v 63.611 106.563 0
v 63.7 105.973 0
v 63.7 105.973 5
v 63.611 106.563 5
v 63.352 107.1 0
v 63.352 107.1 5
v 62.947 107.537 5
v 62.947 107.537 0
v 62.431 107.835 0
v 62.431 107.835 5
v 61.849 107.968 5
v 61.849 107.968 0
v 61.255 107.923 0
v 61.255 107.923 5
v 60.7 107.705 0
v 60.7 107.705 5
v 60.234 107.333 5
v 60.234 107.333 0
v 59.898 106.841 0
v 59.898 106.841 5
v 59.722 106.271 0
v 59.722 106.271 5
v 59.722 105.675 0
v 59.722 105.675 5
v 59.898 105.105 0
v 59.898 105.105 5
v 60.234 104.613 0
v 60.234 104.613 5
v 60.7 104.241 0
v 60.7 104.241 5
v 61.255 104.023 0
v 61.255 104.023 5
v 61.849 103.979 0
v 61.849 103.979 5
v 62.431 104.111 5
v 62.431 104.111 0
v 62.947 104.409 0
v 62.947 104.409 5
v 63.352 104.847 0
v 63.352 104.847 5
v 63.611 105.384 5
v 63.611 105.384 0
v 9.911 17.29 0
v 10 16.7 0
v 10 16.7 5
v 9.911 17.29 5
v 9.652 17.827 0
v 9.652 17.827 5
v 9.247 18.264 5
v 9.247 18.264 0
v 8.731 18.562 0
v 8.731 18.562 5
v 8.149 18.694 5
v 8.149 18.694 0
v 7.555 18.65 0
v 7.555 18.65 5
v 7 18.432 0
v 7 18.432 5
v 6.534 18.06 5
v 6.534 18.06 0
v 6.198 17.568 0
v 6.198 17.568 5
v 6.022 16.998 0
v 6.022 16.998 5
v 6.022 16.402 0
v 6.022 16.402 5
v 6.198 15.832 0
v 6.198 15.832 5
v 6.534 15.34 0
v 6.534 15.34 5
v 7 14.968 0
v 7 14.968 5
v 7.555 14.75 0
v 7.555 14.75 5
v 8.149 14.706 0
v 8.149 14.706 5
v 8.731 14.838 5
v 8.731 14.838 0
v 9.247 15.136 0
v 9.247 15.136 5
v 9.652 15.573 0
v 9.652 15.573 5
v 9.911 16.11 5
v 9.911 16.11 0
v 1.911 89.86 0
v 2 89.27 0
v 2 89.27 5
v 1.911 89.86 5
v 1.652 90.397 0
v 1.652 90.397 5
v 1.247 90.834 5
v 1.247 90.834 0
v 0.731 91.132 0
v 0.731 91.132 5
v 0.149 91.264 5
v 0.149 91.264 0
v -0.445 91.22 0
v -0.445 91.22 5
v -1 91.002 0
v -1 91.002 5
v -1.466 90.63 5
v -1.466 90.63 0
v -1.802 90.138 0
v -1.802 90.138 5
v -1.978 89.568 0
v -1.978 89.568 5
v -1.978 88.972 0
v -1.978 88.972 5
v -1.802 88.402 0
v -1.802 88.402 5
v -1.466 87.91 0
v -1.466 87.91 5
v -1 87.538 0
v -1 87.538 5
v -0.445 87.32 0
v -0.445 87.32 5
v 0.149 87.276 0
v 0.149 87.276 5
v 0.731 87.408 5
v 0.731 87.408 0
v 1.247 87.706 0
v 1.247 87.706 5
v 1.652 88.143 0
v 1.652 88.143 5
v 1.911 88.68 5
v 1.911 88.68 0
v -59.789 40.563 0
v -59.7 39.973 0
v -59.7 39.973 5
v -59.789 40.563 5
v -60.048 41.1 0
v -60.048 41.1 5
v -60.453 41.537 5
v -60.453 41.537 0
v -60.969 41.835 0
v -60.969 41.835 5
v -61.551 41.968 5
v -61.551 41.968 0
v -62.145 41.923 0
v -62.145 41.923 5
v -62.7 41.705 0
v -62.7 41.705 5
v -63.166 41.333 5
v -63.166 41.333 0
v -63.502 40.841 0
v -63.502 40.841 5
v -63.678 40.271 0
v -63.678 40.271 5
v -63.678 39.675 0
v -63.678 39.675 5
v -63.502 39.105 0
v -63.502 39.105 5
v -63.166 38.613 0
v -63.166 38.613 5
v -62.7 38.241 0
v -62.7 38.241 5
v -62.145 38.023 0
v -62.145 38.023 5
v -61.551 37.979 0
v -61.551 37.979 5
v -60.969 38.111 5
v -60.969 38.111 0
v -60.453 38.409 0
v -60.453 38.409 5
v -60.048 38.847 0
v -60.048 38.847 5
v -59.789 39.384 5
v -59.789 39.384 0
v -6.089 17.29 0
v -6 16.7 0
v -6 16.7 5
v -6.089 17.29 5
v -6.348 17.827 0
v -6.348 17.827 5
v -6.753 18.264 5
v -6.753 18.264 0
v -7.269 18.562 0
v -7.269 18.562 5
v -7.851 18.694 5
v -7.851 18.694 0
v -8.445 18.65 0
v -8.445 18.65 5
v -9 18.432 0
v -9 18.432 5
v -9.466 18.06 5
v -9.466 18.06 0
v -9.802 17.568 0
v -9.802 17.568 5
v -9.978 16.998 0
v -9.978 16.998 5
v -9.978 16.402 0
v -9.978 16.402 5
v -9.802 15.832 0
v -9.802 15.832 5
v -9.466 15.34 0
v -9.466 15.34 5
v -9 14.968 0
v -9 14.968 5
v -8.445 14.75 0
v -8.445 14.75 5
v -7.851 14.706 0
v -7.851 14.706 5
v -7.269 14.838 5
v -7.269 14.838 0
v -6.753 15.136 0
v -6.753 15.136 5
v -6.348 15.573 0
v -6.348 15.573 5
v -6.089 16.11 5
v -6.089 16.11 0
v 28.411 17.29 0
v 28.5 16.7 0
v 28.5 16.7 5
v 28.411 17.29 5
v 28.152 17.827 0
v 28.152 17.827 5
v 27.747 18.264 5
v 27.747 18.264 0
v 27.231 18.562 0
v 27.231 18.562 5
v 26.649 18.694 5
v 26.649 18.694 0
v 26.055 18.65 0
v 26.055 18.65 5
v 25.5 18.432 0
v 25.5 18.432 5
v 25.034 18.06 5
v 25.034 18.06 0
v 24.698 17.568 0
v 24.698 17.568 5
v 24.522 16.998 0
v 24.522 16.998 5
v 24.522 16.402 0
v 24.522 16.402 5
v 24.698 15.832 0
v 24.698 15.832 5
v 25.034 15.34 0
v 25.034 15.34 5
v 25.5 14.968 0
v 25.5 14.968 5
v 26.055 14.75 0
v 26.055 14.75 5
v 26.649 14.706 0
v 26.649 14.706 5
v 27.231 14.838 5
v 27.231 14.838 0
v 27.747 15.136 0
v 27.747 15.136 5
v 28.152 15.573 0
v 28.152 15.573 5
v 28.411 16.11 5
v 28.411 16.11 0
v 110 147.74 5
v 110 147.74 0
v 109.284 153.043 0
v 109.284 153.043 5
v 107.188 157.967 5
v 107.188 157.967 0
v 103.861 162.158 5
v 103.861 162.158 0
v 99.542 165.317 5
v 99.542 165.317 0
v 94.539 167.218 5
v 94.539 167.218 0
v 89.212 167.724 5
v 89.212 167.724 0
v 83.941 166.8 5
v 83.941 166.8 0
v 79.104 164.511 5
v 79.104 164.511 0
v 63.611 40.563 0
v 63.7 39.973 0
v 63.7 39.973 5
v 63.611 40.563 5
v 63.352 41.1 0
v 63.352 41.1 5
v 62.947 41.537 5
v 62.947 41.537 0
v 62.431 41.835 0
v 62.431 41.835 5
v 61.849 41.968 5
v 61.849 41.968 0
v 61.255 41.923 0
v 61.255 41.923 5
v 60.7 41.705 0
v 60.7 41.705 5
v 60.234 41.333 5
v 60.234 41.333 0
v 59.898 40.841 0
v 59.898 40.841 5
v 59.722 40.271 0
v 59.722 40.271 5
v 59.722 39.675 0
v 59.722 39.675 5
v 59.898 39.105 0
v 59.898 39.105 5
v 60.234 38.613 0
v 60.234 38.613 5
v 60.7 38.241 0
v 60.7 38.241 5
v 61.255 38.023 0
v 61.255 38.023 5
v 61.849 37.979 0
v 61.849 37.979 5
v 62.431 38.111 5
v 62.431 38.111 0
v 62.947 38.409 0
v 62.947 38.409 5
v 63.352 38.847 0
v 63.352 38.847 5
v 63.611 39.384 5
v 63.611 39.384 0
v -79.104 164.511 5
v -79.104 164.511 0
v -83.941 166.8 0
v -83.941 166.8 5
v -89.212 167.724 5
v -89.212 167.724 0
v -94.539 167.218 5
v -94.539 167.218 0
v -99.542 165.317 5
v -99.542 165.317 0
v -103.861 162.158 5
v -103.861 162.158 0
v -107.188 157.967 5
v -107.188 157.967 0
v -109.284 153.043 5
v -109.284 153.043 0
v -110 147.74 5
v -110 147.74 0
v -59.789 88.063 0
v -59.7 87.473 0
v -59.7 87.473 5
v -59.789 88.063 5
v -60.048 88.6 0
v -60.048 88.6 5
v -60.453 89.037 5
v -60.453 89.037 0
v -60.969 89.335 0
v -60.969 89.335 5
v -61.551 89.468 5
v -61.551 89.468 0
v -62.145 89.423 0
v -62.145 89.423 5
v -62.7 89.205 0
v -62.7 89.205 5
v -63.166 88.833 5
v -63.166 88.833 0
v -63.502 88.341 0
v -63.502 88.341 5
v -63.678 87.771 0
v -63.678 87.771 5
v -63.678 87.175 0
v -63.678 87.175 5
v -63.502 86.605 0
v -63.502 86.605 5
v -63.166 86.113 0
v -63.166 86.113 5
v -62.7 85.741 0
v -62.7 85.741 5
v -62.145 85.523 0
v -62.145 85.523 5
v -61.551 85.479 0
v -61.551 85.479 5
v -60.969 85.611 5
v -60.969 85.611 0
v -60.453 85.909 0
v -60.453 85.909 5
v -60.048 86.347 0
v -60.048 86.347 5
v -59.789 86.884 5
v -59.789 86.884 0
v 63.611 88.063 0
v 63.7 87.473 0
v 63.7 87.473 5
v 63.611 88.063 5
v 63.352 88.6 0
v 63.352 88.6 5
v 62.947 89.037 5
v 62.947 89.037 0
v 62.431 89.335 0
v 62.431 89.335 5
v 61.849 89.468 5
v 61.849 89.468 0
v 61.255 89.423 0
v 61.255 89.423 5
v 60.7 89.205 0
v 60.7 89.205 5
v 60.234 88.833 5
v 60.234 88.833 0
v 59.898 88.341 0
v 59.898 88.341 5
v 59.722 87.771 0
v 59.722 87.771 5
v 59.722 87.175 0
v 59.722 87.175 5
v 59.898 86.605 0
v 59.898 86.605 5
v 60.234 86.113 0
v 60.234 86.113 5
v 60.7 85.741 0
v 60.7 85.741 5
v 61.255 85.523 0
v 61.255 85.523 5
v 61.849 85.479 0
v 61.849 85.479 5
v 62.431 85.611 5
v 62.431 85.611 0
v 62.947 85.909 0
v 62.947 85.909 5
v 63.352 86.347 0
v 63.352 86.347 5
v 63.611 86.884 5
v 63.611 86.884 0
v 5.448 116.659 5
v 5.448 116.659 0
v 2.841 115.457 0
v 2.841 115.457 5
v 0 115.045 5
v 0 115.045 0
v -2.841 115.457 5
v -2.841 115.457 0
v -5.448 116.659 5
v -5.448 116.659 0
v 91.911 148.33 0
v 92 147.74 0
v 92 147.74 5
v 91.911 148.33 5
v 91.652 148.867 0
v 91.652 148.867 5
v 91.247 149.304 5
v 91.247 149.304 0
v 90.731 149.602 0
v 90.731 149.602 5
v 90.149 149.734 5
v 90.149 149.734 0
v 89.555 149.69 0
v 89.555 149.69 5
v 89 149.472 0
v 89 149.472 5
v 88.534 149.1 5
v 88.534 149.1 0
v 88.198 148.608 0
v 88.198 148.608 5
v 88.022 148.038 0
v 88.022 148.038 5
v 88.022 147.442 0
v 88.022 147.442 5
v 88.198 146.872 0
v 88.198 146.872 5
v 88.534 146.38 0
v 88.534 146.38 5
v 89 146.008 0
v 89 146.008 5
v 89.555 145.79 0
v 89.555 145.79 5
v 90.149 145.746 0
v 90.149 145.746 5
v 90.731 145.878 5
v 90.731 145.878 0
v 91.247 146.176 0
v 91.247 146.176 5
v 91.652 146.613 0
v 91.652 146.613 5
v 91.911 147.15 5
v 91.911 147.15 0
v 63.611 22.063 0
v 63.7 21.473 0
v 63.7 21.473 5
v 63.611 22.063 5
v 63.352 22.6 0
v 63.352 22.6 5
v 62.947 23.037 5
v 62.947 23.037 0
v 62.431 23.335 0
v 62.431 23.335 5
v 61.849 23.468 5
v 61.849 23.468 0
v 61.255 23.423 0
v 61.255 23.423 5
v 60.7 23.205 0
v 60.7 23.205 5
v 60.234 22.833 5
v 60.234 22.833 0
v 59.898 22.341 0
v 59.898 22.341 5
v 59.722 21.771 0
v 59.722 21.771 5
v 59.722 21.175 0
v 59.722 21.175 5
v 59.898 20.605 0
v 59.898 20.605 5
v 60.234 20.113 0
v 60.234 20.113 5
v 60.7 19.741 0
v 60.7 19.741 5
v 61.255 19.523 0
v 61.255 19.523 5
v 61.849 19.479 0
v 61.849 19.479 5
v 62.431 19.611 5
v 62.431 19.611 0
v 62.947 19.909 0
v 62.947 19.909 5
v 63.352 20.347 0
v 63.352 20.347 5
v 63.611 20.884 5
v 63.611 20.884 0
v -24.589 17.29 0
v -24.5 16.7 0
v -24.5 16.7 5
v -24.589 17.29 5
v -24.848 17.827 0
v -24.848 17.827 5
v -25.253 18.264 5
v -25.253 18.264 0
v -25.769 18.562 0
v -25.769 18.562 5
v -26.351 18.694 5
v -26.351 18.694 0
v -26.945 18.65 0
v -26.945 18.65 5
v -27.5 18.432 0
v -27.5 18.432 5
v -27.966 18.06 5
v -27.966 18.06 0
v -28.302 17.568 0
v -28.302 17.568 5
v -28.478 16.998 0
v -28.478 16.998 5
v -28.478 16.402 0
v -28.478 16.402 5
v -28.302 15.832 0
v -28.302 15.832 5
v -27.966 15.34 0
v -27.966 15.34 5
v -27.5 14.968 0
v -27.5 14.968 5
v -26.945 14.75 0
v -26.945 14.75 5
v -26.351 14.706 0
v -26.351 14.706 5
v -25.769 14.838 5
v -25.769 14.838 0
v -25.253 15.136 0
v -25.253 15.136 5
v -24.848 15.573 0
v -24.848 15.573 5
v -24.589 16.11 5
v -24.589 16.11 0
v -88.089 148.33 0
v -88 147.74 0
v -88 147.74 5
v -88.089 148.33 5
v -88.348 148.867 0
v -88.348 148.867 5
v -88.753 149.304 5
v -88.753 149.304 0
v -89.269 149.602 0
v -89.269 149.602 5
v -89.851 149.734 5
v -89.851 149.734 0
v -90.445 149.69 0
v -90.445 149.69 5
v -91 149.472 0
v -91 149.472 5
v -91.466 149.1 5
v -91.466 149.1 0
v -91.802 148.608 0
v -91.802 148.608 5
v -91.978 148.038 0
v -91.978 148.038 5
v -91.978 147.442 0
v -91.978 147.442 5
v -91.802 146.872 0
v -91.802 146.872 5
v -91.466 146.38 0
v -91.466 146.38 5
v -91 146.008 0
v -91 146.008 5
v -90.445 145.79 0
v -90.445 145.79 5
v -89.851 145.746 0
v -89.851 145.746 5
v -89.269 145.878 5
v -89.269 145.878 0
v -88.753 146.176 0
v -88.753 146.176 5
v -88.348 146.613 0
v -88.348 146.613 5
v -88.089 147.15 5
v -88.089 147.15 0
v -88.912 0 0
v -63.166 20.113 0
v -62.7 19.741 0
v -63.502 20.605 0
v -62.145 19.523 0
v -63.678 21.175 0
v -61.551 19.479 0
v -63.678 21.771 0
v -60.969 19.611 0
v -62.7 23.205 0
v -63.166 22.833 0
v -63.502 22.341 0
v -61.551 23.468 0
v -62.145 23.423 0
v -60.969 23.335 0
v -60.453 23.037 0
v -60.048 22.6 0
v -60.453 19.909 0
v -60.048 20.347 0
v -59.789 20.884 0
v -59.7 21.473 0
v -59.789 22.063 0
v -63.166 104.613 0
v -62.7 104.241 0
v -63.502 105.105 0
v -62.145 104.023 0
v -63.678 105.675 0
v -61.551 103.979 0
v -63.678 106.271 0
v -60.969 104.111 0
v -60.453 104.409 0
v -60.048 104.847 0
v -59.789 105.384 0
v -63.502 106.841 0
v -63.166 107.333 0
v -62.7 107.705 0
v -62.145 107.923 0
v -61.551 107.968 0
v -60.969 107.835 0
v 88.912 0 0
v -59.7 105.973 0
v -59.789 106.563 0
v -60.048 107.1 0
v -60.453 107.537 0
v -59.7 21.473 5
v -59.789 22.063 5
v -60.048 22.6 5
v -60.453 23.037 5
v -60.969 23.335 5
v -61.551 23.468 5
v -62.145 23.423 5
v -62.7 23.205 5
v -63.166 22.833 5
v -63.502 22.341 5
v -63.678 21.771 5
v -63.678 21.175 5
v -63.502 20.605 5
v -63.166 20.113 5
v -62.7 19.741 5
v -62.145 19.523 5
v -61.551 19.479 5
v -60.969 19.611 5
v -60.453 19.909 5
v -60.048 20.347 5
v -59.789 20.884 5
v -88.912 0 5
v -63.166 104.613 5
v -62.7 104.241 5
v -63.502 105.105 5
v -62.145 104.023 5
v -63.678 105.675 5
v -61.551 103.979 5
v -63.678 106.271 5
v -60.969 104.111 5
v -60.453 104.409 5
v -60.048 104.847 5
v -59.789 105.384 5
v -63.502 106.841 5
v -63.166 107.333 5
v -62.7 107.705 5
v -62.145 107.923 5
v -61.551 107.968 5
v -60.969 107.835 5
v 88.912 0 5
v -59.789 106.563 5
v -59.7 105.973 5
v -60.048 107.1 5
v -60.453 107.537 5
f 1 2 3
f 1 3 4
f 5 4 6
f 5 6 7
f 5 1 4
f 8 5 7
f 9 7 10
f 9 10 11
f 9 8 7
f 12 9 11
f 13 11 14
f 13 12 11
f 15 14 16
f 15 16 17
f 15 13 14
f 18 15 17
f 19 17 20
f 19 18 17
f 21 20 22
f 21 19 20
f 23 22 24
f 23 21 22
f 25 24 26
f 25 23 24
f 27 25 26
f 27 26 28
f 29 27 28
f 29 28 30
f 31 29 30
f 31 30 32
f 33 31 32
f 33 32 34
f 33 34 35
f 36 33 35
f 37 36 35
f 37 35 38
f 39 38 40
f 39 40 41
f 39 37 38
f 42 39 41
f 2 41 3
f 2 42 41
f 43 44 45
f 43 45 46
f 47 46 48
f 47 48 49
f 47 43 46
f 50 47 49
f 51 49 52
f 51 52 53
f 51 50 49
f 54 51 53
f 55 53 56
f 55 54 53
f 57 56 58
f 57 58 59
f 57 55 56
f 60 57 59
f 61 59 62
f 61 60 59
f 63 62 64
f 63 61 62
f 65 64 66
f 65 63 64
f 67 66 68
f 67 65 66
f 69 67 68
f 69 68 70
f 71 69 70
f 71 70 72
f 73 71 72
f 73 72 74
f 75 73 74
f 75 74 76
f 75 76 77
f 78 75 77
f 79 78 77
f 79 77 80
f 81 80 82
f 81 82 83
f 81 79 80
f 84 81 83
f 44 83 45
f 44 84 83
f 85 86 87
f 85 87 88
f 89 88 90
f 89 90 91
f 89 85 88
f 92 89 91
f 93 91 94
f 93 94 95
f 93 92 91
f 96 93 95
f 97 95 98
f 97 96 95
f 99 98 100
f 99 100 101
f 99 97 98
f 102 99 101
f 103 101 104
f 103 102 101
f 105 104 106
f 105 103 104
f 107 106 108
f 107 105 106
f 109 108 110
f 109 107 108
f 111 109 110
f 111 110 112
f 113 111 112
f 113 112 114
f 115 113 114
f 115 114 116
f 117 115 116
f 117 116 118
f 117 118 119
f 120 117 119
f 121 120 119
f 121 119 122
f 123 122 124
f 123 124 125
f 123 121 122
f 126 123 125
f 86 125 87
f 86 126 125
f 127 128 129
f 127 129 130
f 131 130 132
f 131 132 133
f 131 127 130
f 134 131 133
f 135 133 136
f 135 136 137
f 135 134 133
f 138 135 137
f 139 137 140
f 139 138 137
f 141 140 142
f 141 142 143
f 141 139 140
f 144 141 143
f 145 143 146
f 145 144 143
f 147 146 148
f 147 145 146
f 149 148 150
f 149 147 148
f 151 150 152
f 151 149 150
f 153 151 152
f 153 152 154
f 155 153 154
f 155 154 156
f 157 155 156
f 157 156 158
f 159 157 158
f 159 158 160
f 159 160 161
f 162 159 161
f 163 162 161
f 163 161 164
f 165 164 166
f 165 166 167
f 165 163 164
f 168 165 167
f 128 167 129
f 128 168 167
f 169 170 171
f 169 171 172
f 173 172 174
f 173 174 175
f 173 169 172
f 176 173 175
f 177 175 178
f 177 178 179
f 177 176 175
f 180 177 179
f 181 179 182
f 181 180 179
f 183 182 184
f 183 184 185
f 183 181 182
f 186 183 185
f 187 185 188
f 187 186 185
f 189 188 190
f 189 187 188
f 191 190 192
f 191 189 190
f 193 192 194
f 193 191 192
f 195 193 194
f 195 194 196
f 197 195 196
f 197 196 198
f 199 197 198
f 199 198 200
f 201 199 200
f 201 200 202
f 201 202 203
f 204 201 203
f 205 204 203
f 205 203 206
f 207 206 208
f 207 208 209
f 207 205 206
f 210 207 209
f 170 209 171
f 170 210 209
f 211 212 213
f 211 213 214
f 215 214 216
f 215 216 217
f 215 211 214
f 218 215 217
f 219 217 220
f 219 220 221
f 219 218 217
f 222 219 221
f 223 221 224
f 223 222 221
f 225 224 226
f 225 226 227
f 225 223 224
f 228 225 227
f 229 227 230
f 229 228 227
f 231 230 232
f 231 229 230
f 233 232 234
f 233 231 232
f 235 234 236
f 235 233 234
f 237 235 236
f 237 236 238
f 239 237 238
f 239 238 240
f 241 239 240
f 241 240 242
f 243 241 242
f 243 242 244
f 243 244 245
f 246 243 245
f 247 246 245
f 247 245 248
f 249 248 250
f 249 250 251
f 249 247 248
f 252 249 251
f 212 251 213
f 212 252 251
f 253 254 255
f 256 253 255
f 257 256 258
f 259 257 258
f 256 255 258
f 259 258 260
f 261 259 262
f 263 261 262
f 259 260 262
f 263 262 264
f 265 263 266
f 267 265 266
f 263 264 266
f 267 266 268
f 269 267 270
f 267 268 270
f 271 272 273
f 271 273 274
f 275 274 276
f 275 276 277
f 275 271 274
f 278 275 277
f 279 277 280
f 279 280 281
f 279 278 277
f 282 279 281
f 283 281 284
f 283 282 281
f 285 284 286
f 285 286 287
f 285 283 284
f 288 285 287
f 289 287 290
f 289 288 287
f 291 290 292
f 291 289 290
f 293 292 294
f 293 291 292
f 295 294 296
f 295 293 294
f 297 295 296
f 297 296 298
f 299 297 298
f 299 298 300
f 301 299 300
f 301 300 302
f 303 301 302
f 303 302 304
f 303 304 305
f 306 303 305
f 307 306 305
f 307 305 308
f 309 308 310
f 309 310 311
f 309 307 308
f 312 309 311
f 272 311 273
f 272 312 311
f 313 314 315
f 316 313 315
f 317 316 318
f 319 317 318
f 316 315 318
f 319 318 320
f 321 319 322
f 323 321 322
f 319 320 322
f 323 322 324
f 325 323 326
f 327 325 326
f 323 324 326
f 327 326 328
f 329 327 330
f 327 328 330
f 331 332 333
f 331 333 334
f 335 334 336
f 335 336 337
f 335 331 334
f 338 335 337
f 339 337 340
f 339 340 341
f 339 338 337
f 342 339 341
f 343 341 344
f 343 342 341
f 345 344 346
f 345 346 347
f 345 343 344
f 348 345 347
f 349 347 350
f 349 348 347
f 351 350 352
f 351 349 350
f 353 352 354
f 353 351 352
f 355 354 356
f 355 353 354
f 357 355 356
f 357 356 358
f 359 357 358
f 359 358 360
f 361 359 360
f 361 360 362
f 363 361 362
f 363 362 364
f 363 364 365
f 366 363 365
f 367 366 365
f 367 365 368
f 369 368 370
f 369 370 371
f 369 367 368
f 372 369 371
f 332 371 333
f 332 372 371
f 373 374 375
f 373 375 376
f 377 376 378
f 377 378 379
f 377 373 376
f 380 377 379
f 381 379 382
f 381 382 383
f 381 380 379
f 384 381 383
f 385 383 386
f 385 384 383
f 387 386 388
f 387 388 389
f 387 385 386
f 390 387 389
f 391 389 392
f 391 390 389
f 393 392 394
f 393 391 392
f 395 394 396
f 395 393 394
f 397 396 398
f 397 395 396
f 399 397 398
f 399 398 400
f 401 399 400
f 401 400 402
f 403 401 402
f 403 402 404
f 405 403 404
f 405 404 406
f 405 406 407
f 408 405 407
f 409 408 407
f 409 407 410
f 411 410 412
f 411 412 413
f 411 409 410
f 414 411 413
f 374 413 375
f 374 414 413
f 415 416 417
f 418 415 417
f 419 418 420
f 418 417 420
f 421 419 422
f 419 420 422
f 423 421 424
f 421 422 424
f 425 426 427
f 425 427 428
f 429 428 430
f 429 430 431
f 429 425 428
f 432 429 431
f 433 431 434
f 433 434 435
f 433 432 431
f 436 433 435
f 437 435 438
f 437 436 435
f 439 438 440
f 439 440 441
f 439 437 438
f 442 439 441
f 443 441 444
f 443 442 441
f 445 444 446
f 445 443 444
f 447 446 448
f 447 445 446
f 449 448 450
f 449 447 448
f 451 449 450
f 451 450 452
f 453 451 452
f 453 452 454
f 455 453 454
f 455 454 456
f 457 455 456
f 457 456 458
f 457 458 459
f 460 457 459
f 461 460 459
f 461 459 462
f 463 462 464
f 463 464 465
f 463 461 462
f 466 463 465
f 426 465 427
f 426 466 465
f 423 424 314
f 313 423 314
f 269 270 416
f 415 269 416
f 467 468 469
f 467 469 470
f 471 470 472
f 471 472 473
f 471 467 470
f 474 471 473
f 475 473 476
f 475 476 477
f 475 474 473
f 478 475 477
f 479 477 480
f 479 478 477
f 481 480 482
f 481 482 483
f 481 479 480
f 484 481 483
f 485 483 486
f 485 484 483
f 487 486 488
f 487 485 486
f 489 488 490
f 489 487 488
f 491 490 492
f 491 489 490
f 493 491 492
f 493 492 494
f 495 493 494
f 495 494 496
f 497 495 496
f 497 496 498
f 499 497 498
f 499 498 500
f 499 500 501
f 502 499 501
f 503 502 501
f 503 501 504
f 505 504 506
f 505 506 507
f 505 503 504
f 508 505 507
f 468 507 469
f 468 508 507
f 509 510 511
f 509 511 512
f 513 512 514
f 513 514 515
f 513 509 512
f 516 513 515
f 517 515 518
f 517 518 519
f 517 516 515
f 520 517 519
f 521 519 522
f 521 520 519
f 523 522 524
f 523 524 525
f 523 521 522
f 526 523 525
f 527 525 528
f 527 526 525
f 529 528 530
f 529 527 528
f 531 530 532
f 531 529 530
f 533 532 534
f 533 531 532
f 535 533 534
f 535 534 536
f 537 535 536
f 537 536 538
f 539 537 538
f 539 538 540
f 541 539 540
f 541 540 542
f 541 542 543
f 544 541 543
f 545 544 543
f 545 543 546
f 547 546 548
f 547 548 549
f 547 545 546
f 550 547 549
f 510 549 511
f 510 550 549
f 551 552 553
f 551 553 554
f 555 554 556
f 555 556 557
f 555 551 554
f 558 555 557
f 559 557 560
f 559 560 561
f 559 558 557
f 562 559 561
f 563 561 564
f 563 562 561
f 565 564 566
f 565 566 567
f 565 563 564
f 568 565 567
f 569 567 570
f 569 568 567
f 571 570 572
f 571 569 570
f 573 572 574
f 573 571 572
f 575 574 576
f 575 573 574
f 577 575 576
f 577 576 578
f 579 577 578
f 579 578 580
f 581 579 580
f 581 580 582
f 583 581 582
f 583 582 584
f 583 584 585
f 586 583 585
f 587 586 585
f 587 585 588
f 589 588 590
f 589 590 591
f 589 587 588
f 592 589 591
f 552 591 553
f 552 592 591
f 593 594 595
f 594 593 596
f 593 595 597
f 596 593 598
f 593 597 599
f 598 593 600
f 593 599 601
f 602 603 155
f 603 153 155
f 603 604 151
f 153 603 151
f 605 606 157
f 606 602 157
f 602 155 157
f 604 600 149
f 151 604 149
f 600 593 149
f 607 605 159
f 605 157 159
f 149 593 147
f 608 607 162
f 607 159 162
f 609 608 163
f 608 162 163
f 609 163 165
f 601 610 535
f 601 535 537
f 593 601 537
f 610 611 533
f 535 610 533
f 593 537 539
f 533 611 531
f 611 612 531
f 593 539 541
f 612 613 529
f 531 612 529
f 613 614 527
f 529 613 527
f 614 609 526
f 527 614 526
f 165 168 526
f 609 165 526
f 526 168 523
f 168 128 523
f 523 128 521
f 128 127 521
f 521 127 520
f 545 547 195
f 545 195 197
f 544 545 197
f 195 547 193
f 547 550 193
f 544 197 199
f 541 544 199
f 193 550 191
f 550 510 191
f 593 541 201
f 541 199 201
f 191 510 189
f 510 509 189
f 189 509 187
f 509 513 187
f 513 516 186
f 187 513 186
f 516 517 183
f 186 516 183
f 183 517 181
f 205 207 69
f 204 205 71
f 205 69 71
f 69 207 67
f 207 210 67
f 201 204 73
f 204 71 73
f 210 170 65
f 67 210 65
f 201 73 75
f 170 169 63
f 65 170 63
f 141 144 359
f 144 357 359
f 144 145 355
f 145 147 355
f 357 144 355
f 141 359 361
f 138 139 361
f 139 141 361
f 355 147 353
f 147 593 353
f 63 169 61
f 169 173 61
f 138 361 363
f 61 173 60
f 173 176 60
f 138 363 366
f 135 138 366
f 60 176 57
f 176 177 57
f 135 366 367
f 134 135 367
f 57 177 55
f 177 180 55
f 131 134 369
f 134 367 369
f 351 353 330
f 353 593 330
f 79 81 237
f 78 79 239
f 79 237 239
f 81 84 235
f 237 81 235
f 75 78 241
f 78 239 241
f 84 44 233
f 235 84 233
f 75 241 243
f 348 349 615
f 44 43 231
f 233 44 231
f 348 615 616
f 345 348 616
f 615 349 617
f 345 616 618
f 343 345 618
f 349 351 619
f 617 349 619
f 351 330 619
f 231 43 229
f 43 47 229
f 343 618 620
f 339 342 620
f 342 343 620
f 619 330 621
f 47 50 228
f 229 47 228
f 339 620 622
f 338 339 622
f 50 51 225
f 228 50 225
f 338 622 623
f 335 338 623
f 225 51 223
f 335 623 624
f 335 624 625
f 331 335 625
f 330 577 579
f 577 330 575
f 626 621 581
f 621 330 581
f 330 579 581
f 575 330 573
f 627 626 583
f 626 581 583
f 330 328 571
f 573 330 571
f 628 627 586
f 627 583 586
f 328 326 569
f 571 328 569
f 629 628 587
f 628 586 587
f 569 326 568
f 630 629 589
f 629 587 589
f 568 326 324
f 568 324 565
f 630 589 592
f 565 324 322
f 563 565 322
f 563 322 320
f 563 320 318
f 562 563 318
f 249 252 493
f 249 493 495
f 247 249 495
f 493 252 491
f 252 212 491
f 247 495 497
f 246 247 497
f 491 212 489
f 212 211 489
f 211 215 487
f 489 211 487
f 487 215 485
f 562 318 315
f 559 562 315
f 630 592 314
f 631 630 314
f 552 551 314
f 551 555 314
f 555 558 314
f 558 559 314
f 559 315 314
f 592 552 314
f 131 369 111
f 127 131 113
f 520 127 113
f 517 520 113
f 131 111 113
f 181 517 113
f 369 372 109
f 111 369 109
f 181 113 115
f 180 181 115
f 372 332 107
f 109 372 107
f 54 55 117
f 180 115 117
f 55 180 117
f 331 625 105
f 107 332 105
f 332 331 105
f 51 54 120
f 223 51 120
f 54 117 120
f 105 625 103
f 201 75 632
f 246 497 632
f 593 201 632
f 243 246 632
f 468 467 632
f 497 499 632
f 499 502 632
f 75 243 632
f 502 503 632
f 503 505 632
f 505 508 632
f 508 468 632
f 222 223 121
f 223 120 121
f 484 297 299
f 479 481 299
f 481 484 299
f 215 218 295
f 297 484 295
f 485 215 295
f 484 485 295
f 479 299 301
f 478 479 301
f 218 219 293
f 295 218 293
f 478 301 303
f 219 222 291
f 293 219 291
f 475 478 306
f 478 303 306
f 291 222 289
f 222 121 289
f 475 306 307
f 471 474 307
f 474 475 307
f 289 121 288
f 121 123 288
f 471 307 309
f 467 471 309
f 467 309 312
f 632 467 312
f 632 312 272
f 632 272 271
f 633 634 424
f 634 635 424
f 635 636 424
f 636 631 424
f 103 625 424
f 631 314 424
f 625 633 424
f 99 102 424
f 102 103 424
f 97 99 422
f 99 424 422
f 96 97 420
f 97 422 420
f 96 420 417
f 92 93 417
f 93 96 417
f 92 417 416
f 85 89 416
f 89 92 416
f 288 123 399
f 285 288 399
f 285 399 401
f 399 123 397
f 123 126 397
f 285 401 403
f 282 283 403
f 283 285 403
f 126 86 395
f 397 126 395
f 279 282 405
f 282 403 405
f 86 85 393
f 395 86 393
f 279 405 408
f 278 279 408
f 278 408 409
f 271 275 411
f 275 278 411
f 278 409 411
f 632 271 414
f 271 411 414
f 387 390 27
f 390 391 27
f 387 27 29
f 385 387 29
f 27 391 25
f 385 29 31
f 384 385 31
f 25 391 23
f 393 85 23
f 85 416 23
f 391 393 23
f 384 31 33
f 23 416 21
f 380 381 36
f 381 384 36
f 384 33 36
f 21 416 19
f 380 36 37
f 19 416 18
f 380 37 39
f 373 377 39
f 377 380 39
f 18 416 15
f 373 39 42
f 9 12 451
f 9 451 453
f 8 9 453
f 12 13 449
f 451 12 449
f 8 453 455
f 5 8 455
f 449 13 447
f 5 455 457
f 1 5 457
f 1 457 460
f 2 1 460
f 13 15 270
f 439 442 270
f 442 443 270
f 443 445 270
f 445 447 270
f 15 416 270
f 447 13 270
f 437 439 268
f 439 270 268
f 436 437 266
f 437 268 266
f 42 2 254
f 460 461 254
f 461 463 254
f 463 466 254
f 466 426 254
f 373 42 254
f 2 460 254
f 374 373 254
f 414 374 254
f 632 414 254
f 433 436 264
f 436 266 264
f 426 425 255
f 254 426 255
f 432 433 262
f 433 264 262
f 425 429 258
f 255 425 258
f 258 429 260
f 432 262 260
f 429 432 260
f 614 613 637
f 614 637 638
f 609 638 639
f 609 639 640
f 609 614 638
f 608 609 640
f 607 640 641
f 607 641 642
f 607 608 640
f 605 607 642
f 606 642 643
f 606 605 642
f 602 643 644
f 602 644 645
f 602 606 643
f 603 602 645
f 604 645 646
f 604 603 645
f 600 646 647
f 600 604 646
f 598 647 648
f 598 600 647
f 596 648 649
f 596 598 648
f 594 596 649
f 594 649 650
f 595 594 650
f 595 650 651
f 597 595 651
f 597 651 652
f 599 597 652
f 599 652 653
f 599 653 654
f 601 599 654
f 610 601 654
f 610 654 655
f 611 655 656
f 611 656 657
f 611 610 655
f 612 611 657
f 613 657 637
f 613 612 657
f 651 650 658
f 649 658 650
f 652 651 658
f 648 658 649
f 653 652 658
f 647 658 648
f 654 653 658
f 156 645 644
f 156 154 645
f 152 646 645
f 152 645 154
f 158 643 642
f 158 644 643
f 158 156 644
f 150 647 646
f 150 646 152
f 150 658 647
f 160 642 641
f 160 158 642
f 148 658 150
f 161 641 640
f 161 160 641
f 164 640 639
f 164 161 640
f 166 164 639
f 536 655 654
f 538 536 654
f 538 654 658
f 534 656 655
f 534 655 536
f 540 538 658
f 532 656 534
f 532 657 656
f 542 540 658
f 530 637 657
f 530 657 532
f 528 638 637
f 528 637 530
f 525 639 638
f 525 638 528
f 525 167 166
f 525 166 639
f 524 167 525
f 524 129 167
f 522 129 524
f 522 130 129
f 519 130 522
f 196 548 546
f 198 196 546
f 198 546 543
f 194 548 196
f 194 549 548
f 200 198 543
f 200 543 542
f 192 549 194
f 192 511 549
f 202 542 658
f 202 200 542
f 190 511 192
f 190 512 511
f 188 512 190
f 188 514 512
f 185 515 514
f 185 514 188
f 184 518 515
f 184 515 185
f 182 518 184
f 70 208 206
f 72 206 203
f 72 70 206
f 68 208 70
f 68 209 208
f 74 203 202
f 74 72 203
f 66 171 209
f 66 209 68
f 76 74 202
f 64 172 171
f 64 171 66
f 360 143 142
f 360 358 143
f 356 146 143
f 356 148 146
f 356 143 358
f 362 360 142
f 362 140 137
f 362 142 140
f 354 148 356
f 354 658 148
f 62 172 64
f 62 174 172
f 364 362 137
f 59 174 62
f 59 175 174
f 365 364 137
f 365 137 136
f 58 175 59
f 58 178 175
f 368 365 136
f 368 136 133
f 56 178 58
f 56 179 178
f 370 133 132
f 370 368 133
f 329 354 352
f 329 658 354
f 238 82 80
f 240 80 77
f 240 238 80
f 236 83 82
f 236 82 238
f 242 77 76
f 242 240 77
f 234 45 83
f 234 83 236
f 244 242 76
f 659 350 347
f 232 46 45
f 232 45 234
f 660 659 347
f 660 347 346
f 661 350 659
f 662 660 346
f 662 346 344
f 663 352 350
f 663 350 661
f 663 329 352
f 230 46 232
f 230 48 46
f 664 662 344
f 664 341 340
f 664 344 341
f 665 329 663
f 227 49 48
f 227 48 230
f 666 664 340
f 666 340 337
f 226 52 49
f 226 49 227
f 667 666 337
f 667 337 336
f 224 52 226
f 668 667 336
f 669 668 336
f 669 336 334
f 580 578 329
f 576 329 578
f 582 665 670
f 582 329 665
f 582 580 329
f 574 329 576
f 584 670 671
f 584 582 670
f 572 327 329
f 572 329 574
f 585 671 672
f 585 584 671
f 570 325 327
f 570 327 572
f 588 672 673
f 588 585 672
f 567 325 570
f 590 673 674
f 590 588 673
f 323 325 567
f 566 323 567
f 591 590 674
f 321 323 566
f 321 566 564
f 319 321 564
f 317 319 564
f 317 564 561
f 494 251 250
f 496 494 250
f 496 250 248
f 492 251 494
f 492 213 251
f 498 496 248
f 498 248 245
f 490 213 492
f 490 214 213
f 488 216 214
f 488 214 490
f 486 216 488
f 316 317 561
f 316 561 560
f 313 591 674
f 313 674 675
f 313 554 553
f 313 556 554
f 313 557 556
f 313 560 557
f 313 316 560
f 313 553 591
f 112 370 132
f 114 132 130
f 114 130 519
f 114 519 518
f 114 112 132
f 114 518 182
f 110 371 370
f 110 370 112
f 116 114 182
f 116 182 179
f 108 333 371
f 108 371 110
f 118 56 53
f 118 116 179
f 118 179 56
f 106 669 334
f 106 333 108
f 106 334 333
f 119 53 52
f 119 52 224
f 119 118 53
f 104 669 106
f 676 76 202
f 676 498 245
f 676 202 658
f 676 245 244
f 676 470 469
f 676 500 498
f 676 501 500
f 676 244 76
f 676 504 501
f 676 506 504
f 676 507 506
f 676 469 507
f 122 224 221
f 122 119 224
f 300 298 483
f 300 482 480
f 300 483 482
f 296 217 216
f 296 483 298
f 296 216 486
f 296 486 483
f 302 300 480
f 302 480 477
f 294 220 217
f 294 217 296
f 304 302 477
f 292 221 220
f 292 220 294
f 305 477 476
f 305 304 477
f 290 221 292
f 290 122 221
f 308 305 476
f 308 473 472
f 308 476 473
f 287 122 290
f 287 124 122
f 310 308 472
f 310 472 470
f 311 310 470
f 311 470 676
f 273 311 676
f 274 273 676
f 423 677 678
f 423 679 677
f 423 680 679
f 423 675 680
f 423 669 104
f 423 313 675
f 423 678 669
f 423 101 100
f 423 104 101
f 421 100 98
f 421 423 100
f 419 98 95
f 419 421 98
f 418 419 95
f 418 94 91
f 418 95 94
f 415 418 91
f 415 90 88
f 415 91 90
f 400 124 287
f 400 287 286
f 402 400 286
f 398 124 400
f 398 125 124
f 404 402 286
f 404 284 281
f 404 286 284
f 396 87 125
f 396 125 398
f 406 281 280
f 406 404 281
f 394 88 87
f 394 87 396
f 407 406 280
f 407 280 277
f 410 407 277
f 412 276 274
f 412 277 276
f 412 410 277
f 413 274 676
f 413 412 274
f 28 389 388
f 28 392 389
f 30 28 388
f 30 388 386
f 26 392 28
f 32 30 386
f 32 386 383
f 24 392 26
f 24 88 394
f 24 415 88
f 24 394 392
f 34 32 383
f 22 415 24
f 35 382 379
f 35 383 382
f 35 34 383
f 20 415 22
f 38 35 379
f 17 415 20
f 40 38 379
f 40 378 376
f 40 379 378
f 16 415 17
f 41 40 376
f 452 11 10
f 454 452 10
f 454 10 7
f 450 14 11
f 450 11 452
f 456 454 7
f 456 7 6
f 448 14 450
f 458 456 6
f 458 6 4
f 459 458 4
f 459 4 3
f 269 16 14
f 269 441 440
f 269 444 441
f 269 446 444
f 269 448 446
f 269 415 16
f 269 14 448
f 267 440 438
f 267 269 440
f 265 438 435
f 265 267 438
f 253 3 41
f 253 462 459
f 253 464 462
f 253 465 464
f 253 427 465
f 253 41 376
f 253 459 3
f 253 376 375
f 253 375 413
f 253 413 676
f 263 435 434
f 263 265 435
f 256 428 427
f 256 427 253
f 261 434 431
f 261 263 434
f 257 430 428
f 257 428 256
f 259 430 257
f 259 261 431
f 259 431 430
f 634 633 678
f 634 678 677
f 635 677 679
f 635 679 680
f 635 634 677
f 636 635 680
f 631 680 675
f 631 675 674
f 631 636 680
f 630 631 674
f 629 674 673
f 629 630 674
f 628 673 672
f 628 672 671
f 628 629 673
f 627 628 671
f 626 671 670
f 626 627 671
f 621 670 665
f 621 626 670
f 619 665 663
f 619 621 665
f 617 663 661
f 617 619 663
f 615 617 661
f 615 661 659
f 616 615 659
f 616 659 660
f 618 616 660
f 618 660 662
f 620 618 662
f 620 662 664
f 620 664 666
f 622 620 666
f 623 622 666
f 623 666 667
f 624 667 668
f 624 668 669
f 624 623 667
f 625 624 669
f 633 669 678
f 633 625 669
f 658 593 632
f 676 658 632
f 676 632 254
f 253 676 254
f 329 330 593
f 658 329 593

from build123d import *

# Parameters (mm, degrees)
SKETCH_1_R      = 2
EXTRUDE_1_DEPTH = 5


with BuildPart() as part:
    # 草图1 → 凸台-拉伸1 (new body)
    with BuildSketch(Plane.XY):
        with BuildLine():
            Line((-110, 147.74), (-88.912084744, 0))
            Line((-88.912084744, 0), (88.912084744, 0))
            Line((88.912084744, 0), (110, 147.74))
            ThreePointArc((110, 147.74), (99.541573939, 165.317211576), (79.104163323, 164.511426389))
            Line((79.104163323, 164.511426389), (5.447918339, 116.65941923))
            ThreePointArc((5.447918339, 116.65941923), (0, 115.045132425), (-5.447918339, 116.65941923))
            Line((-5.447918339, 116.65941923), (-79.104163323, 164.511426389))
            ThreePointArc((-79.104163323, 164.511426389), (-99.541573939, 165.317211576), (-110, 147.74))
        make_face()
        with Locations((61.7, 105.973140904)):
            Circle(SKETCH_1_R, mode=Mode.SUBTRACT)
        with Locations((-61.7, 21.473140904)):
            Circle(SKETCH_1_R, mode=Mode.SUBTRACT)
        with Locations((-61.7, 39.973140904)):
            Circle(SKETCH_1_R, mode=Mode.SUBTRACT)
        with Locations((-26.5, 16.7)):
            Circle(SKETCH_1_R, mode=Mode.SUBTRACT)
        with Locations((-8, 16.7)):
            Circle(SKETCH_1_R, mode=Mode.SUBTRACT)
        with Locations((8, 16.7)):
            Circle(SKETCH_1_R, mode=Mode.SUBTRACT)
        with Locations((26.5, 16.7)):
            Circle(SKETCH_1_R, mode=Mode.SUBTRACT)
        with Locations((-61.7, 87.473140904)):
            Circle(SKETCH_1_R, mode=Mode.SUBTRACT)
        with Locations((-61.7, 105.973140904)):
            Circle(SKETCH_1_R, mode=Mode.SUBTRACT)
        with Locations((-90, 147.74)):
            Circle(SKETCH_1_R, mode=Mode.SUBTRACT)
        with Locations((0, 89.27)):
            Circle(SKETCH_1_R, mode=Mode.SUBTRACT)
        with Locations((90, 147.74)):
            Circle(SKETCH_1_R, mode=Mode.SUBTRACT)
        with Locations((61.7, 87.473140904)):
            Circle(SKETCH_1_R, mode=Mode.SUBTRACT)
        with Locations((61.7, 39.973140904)):
            Circle(SKETCH_1_R, mode=Mode.SUBTRACT)
        with Locations((61.7, 21.473140904)):
            Circle(SKETCH_1_R, mode=Mode.SUBTRACT)
    extrude(amount=EXTRUDE_1_DEPTH)


solid = part.part
